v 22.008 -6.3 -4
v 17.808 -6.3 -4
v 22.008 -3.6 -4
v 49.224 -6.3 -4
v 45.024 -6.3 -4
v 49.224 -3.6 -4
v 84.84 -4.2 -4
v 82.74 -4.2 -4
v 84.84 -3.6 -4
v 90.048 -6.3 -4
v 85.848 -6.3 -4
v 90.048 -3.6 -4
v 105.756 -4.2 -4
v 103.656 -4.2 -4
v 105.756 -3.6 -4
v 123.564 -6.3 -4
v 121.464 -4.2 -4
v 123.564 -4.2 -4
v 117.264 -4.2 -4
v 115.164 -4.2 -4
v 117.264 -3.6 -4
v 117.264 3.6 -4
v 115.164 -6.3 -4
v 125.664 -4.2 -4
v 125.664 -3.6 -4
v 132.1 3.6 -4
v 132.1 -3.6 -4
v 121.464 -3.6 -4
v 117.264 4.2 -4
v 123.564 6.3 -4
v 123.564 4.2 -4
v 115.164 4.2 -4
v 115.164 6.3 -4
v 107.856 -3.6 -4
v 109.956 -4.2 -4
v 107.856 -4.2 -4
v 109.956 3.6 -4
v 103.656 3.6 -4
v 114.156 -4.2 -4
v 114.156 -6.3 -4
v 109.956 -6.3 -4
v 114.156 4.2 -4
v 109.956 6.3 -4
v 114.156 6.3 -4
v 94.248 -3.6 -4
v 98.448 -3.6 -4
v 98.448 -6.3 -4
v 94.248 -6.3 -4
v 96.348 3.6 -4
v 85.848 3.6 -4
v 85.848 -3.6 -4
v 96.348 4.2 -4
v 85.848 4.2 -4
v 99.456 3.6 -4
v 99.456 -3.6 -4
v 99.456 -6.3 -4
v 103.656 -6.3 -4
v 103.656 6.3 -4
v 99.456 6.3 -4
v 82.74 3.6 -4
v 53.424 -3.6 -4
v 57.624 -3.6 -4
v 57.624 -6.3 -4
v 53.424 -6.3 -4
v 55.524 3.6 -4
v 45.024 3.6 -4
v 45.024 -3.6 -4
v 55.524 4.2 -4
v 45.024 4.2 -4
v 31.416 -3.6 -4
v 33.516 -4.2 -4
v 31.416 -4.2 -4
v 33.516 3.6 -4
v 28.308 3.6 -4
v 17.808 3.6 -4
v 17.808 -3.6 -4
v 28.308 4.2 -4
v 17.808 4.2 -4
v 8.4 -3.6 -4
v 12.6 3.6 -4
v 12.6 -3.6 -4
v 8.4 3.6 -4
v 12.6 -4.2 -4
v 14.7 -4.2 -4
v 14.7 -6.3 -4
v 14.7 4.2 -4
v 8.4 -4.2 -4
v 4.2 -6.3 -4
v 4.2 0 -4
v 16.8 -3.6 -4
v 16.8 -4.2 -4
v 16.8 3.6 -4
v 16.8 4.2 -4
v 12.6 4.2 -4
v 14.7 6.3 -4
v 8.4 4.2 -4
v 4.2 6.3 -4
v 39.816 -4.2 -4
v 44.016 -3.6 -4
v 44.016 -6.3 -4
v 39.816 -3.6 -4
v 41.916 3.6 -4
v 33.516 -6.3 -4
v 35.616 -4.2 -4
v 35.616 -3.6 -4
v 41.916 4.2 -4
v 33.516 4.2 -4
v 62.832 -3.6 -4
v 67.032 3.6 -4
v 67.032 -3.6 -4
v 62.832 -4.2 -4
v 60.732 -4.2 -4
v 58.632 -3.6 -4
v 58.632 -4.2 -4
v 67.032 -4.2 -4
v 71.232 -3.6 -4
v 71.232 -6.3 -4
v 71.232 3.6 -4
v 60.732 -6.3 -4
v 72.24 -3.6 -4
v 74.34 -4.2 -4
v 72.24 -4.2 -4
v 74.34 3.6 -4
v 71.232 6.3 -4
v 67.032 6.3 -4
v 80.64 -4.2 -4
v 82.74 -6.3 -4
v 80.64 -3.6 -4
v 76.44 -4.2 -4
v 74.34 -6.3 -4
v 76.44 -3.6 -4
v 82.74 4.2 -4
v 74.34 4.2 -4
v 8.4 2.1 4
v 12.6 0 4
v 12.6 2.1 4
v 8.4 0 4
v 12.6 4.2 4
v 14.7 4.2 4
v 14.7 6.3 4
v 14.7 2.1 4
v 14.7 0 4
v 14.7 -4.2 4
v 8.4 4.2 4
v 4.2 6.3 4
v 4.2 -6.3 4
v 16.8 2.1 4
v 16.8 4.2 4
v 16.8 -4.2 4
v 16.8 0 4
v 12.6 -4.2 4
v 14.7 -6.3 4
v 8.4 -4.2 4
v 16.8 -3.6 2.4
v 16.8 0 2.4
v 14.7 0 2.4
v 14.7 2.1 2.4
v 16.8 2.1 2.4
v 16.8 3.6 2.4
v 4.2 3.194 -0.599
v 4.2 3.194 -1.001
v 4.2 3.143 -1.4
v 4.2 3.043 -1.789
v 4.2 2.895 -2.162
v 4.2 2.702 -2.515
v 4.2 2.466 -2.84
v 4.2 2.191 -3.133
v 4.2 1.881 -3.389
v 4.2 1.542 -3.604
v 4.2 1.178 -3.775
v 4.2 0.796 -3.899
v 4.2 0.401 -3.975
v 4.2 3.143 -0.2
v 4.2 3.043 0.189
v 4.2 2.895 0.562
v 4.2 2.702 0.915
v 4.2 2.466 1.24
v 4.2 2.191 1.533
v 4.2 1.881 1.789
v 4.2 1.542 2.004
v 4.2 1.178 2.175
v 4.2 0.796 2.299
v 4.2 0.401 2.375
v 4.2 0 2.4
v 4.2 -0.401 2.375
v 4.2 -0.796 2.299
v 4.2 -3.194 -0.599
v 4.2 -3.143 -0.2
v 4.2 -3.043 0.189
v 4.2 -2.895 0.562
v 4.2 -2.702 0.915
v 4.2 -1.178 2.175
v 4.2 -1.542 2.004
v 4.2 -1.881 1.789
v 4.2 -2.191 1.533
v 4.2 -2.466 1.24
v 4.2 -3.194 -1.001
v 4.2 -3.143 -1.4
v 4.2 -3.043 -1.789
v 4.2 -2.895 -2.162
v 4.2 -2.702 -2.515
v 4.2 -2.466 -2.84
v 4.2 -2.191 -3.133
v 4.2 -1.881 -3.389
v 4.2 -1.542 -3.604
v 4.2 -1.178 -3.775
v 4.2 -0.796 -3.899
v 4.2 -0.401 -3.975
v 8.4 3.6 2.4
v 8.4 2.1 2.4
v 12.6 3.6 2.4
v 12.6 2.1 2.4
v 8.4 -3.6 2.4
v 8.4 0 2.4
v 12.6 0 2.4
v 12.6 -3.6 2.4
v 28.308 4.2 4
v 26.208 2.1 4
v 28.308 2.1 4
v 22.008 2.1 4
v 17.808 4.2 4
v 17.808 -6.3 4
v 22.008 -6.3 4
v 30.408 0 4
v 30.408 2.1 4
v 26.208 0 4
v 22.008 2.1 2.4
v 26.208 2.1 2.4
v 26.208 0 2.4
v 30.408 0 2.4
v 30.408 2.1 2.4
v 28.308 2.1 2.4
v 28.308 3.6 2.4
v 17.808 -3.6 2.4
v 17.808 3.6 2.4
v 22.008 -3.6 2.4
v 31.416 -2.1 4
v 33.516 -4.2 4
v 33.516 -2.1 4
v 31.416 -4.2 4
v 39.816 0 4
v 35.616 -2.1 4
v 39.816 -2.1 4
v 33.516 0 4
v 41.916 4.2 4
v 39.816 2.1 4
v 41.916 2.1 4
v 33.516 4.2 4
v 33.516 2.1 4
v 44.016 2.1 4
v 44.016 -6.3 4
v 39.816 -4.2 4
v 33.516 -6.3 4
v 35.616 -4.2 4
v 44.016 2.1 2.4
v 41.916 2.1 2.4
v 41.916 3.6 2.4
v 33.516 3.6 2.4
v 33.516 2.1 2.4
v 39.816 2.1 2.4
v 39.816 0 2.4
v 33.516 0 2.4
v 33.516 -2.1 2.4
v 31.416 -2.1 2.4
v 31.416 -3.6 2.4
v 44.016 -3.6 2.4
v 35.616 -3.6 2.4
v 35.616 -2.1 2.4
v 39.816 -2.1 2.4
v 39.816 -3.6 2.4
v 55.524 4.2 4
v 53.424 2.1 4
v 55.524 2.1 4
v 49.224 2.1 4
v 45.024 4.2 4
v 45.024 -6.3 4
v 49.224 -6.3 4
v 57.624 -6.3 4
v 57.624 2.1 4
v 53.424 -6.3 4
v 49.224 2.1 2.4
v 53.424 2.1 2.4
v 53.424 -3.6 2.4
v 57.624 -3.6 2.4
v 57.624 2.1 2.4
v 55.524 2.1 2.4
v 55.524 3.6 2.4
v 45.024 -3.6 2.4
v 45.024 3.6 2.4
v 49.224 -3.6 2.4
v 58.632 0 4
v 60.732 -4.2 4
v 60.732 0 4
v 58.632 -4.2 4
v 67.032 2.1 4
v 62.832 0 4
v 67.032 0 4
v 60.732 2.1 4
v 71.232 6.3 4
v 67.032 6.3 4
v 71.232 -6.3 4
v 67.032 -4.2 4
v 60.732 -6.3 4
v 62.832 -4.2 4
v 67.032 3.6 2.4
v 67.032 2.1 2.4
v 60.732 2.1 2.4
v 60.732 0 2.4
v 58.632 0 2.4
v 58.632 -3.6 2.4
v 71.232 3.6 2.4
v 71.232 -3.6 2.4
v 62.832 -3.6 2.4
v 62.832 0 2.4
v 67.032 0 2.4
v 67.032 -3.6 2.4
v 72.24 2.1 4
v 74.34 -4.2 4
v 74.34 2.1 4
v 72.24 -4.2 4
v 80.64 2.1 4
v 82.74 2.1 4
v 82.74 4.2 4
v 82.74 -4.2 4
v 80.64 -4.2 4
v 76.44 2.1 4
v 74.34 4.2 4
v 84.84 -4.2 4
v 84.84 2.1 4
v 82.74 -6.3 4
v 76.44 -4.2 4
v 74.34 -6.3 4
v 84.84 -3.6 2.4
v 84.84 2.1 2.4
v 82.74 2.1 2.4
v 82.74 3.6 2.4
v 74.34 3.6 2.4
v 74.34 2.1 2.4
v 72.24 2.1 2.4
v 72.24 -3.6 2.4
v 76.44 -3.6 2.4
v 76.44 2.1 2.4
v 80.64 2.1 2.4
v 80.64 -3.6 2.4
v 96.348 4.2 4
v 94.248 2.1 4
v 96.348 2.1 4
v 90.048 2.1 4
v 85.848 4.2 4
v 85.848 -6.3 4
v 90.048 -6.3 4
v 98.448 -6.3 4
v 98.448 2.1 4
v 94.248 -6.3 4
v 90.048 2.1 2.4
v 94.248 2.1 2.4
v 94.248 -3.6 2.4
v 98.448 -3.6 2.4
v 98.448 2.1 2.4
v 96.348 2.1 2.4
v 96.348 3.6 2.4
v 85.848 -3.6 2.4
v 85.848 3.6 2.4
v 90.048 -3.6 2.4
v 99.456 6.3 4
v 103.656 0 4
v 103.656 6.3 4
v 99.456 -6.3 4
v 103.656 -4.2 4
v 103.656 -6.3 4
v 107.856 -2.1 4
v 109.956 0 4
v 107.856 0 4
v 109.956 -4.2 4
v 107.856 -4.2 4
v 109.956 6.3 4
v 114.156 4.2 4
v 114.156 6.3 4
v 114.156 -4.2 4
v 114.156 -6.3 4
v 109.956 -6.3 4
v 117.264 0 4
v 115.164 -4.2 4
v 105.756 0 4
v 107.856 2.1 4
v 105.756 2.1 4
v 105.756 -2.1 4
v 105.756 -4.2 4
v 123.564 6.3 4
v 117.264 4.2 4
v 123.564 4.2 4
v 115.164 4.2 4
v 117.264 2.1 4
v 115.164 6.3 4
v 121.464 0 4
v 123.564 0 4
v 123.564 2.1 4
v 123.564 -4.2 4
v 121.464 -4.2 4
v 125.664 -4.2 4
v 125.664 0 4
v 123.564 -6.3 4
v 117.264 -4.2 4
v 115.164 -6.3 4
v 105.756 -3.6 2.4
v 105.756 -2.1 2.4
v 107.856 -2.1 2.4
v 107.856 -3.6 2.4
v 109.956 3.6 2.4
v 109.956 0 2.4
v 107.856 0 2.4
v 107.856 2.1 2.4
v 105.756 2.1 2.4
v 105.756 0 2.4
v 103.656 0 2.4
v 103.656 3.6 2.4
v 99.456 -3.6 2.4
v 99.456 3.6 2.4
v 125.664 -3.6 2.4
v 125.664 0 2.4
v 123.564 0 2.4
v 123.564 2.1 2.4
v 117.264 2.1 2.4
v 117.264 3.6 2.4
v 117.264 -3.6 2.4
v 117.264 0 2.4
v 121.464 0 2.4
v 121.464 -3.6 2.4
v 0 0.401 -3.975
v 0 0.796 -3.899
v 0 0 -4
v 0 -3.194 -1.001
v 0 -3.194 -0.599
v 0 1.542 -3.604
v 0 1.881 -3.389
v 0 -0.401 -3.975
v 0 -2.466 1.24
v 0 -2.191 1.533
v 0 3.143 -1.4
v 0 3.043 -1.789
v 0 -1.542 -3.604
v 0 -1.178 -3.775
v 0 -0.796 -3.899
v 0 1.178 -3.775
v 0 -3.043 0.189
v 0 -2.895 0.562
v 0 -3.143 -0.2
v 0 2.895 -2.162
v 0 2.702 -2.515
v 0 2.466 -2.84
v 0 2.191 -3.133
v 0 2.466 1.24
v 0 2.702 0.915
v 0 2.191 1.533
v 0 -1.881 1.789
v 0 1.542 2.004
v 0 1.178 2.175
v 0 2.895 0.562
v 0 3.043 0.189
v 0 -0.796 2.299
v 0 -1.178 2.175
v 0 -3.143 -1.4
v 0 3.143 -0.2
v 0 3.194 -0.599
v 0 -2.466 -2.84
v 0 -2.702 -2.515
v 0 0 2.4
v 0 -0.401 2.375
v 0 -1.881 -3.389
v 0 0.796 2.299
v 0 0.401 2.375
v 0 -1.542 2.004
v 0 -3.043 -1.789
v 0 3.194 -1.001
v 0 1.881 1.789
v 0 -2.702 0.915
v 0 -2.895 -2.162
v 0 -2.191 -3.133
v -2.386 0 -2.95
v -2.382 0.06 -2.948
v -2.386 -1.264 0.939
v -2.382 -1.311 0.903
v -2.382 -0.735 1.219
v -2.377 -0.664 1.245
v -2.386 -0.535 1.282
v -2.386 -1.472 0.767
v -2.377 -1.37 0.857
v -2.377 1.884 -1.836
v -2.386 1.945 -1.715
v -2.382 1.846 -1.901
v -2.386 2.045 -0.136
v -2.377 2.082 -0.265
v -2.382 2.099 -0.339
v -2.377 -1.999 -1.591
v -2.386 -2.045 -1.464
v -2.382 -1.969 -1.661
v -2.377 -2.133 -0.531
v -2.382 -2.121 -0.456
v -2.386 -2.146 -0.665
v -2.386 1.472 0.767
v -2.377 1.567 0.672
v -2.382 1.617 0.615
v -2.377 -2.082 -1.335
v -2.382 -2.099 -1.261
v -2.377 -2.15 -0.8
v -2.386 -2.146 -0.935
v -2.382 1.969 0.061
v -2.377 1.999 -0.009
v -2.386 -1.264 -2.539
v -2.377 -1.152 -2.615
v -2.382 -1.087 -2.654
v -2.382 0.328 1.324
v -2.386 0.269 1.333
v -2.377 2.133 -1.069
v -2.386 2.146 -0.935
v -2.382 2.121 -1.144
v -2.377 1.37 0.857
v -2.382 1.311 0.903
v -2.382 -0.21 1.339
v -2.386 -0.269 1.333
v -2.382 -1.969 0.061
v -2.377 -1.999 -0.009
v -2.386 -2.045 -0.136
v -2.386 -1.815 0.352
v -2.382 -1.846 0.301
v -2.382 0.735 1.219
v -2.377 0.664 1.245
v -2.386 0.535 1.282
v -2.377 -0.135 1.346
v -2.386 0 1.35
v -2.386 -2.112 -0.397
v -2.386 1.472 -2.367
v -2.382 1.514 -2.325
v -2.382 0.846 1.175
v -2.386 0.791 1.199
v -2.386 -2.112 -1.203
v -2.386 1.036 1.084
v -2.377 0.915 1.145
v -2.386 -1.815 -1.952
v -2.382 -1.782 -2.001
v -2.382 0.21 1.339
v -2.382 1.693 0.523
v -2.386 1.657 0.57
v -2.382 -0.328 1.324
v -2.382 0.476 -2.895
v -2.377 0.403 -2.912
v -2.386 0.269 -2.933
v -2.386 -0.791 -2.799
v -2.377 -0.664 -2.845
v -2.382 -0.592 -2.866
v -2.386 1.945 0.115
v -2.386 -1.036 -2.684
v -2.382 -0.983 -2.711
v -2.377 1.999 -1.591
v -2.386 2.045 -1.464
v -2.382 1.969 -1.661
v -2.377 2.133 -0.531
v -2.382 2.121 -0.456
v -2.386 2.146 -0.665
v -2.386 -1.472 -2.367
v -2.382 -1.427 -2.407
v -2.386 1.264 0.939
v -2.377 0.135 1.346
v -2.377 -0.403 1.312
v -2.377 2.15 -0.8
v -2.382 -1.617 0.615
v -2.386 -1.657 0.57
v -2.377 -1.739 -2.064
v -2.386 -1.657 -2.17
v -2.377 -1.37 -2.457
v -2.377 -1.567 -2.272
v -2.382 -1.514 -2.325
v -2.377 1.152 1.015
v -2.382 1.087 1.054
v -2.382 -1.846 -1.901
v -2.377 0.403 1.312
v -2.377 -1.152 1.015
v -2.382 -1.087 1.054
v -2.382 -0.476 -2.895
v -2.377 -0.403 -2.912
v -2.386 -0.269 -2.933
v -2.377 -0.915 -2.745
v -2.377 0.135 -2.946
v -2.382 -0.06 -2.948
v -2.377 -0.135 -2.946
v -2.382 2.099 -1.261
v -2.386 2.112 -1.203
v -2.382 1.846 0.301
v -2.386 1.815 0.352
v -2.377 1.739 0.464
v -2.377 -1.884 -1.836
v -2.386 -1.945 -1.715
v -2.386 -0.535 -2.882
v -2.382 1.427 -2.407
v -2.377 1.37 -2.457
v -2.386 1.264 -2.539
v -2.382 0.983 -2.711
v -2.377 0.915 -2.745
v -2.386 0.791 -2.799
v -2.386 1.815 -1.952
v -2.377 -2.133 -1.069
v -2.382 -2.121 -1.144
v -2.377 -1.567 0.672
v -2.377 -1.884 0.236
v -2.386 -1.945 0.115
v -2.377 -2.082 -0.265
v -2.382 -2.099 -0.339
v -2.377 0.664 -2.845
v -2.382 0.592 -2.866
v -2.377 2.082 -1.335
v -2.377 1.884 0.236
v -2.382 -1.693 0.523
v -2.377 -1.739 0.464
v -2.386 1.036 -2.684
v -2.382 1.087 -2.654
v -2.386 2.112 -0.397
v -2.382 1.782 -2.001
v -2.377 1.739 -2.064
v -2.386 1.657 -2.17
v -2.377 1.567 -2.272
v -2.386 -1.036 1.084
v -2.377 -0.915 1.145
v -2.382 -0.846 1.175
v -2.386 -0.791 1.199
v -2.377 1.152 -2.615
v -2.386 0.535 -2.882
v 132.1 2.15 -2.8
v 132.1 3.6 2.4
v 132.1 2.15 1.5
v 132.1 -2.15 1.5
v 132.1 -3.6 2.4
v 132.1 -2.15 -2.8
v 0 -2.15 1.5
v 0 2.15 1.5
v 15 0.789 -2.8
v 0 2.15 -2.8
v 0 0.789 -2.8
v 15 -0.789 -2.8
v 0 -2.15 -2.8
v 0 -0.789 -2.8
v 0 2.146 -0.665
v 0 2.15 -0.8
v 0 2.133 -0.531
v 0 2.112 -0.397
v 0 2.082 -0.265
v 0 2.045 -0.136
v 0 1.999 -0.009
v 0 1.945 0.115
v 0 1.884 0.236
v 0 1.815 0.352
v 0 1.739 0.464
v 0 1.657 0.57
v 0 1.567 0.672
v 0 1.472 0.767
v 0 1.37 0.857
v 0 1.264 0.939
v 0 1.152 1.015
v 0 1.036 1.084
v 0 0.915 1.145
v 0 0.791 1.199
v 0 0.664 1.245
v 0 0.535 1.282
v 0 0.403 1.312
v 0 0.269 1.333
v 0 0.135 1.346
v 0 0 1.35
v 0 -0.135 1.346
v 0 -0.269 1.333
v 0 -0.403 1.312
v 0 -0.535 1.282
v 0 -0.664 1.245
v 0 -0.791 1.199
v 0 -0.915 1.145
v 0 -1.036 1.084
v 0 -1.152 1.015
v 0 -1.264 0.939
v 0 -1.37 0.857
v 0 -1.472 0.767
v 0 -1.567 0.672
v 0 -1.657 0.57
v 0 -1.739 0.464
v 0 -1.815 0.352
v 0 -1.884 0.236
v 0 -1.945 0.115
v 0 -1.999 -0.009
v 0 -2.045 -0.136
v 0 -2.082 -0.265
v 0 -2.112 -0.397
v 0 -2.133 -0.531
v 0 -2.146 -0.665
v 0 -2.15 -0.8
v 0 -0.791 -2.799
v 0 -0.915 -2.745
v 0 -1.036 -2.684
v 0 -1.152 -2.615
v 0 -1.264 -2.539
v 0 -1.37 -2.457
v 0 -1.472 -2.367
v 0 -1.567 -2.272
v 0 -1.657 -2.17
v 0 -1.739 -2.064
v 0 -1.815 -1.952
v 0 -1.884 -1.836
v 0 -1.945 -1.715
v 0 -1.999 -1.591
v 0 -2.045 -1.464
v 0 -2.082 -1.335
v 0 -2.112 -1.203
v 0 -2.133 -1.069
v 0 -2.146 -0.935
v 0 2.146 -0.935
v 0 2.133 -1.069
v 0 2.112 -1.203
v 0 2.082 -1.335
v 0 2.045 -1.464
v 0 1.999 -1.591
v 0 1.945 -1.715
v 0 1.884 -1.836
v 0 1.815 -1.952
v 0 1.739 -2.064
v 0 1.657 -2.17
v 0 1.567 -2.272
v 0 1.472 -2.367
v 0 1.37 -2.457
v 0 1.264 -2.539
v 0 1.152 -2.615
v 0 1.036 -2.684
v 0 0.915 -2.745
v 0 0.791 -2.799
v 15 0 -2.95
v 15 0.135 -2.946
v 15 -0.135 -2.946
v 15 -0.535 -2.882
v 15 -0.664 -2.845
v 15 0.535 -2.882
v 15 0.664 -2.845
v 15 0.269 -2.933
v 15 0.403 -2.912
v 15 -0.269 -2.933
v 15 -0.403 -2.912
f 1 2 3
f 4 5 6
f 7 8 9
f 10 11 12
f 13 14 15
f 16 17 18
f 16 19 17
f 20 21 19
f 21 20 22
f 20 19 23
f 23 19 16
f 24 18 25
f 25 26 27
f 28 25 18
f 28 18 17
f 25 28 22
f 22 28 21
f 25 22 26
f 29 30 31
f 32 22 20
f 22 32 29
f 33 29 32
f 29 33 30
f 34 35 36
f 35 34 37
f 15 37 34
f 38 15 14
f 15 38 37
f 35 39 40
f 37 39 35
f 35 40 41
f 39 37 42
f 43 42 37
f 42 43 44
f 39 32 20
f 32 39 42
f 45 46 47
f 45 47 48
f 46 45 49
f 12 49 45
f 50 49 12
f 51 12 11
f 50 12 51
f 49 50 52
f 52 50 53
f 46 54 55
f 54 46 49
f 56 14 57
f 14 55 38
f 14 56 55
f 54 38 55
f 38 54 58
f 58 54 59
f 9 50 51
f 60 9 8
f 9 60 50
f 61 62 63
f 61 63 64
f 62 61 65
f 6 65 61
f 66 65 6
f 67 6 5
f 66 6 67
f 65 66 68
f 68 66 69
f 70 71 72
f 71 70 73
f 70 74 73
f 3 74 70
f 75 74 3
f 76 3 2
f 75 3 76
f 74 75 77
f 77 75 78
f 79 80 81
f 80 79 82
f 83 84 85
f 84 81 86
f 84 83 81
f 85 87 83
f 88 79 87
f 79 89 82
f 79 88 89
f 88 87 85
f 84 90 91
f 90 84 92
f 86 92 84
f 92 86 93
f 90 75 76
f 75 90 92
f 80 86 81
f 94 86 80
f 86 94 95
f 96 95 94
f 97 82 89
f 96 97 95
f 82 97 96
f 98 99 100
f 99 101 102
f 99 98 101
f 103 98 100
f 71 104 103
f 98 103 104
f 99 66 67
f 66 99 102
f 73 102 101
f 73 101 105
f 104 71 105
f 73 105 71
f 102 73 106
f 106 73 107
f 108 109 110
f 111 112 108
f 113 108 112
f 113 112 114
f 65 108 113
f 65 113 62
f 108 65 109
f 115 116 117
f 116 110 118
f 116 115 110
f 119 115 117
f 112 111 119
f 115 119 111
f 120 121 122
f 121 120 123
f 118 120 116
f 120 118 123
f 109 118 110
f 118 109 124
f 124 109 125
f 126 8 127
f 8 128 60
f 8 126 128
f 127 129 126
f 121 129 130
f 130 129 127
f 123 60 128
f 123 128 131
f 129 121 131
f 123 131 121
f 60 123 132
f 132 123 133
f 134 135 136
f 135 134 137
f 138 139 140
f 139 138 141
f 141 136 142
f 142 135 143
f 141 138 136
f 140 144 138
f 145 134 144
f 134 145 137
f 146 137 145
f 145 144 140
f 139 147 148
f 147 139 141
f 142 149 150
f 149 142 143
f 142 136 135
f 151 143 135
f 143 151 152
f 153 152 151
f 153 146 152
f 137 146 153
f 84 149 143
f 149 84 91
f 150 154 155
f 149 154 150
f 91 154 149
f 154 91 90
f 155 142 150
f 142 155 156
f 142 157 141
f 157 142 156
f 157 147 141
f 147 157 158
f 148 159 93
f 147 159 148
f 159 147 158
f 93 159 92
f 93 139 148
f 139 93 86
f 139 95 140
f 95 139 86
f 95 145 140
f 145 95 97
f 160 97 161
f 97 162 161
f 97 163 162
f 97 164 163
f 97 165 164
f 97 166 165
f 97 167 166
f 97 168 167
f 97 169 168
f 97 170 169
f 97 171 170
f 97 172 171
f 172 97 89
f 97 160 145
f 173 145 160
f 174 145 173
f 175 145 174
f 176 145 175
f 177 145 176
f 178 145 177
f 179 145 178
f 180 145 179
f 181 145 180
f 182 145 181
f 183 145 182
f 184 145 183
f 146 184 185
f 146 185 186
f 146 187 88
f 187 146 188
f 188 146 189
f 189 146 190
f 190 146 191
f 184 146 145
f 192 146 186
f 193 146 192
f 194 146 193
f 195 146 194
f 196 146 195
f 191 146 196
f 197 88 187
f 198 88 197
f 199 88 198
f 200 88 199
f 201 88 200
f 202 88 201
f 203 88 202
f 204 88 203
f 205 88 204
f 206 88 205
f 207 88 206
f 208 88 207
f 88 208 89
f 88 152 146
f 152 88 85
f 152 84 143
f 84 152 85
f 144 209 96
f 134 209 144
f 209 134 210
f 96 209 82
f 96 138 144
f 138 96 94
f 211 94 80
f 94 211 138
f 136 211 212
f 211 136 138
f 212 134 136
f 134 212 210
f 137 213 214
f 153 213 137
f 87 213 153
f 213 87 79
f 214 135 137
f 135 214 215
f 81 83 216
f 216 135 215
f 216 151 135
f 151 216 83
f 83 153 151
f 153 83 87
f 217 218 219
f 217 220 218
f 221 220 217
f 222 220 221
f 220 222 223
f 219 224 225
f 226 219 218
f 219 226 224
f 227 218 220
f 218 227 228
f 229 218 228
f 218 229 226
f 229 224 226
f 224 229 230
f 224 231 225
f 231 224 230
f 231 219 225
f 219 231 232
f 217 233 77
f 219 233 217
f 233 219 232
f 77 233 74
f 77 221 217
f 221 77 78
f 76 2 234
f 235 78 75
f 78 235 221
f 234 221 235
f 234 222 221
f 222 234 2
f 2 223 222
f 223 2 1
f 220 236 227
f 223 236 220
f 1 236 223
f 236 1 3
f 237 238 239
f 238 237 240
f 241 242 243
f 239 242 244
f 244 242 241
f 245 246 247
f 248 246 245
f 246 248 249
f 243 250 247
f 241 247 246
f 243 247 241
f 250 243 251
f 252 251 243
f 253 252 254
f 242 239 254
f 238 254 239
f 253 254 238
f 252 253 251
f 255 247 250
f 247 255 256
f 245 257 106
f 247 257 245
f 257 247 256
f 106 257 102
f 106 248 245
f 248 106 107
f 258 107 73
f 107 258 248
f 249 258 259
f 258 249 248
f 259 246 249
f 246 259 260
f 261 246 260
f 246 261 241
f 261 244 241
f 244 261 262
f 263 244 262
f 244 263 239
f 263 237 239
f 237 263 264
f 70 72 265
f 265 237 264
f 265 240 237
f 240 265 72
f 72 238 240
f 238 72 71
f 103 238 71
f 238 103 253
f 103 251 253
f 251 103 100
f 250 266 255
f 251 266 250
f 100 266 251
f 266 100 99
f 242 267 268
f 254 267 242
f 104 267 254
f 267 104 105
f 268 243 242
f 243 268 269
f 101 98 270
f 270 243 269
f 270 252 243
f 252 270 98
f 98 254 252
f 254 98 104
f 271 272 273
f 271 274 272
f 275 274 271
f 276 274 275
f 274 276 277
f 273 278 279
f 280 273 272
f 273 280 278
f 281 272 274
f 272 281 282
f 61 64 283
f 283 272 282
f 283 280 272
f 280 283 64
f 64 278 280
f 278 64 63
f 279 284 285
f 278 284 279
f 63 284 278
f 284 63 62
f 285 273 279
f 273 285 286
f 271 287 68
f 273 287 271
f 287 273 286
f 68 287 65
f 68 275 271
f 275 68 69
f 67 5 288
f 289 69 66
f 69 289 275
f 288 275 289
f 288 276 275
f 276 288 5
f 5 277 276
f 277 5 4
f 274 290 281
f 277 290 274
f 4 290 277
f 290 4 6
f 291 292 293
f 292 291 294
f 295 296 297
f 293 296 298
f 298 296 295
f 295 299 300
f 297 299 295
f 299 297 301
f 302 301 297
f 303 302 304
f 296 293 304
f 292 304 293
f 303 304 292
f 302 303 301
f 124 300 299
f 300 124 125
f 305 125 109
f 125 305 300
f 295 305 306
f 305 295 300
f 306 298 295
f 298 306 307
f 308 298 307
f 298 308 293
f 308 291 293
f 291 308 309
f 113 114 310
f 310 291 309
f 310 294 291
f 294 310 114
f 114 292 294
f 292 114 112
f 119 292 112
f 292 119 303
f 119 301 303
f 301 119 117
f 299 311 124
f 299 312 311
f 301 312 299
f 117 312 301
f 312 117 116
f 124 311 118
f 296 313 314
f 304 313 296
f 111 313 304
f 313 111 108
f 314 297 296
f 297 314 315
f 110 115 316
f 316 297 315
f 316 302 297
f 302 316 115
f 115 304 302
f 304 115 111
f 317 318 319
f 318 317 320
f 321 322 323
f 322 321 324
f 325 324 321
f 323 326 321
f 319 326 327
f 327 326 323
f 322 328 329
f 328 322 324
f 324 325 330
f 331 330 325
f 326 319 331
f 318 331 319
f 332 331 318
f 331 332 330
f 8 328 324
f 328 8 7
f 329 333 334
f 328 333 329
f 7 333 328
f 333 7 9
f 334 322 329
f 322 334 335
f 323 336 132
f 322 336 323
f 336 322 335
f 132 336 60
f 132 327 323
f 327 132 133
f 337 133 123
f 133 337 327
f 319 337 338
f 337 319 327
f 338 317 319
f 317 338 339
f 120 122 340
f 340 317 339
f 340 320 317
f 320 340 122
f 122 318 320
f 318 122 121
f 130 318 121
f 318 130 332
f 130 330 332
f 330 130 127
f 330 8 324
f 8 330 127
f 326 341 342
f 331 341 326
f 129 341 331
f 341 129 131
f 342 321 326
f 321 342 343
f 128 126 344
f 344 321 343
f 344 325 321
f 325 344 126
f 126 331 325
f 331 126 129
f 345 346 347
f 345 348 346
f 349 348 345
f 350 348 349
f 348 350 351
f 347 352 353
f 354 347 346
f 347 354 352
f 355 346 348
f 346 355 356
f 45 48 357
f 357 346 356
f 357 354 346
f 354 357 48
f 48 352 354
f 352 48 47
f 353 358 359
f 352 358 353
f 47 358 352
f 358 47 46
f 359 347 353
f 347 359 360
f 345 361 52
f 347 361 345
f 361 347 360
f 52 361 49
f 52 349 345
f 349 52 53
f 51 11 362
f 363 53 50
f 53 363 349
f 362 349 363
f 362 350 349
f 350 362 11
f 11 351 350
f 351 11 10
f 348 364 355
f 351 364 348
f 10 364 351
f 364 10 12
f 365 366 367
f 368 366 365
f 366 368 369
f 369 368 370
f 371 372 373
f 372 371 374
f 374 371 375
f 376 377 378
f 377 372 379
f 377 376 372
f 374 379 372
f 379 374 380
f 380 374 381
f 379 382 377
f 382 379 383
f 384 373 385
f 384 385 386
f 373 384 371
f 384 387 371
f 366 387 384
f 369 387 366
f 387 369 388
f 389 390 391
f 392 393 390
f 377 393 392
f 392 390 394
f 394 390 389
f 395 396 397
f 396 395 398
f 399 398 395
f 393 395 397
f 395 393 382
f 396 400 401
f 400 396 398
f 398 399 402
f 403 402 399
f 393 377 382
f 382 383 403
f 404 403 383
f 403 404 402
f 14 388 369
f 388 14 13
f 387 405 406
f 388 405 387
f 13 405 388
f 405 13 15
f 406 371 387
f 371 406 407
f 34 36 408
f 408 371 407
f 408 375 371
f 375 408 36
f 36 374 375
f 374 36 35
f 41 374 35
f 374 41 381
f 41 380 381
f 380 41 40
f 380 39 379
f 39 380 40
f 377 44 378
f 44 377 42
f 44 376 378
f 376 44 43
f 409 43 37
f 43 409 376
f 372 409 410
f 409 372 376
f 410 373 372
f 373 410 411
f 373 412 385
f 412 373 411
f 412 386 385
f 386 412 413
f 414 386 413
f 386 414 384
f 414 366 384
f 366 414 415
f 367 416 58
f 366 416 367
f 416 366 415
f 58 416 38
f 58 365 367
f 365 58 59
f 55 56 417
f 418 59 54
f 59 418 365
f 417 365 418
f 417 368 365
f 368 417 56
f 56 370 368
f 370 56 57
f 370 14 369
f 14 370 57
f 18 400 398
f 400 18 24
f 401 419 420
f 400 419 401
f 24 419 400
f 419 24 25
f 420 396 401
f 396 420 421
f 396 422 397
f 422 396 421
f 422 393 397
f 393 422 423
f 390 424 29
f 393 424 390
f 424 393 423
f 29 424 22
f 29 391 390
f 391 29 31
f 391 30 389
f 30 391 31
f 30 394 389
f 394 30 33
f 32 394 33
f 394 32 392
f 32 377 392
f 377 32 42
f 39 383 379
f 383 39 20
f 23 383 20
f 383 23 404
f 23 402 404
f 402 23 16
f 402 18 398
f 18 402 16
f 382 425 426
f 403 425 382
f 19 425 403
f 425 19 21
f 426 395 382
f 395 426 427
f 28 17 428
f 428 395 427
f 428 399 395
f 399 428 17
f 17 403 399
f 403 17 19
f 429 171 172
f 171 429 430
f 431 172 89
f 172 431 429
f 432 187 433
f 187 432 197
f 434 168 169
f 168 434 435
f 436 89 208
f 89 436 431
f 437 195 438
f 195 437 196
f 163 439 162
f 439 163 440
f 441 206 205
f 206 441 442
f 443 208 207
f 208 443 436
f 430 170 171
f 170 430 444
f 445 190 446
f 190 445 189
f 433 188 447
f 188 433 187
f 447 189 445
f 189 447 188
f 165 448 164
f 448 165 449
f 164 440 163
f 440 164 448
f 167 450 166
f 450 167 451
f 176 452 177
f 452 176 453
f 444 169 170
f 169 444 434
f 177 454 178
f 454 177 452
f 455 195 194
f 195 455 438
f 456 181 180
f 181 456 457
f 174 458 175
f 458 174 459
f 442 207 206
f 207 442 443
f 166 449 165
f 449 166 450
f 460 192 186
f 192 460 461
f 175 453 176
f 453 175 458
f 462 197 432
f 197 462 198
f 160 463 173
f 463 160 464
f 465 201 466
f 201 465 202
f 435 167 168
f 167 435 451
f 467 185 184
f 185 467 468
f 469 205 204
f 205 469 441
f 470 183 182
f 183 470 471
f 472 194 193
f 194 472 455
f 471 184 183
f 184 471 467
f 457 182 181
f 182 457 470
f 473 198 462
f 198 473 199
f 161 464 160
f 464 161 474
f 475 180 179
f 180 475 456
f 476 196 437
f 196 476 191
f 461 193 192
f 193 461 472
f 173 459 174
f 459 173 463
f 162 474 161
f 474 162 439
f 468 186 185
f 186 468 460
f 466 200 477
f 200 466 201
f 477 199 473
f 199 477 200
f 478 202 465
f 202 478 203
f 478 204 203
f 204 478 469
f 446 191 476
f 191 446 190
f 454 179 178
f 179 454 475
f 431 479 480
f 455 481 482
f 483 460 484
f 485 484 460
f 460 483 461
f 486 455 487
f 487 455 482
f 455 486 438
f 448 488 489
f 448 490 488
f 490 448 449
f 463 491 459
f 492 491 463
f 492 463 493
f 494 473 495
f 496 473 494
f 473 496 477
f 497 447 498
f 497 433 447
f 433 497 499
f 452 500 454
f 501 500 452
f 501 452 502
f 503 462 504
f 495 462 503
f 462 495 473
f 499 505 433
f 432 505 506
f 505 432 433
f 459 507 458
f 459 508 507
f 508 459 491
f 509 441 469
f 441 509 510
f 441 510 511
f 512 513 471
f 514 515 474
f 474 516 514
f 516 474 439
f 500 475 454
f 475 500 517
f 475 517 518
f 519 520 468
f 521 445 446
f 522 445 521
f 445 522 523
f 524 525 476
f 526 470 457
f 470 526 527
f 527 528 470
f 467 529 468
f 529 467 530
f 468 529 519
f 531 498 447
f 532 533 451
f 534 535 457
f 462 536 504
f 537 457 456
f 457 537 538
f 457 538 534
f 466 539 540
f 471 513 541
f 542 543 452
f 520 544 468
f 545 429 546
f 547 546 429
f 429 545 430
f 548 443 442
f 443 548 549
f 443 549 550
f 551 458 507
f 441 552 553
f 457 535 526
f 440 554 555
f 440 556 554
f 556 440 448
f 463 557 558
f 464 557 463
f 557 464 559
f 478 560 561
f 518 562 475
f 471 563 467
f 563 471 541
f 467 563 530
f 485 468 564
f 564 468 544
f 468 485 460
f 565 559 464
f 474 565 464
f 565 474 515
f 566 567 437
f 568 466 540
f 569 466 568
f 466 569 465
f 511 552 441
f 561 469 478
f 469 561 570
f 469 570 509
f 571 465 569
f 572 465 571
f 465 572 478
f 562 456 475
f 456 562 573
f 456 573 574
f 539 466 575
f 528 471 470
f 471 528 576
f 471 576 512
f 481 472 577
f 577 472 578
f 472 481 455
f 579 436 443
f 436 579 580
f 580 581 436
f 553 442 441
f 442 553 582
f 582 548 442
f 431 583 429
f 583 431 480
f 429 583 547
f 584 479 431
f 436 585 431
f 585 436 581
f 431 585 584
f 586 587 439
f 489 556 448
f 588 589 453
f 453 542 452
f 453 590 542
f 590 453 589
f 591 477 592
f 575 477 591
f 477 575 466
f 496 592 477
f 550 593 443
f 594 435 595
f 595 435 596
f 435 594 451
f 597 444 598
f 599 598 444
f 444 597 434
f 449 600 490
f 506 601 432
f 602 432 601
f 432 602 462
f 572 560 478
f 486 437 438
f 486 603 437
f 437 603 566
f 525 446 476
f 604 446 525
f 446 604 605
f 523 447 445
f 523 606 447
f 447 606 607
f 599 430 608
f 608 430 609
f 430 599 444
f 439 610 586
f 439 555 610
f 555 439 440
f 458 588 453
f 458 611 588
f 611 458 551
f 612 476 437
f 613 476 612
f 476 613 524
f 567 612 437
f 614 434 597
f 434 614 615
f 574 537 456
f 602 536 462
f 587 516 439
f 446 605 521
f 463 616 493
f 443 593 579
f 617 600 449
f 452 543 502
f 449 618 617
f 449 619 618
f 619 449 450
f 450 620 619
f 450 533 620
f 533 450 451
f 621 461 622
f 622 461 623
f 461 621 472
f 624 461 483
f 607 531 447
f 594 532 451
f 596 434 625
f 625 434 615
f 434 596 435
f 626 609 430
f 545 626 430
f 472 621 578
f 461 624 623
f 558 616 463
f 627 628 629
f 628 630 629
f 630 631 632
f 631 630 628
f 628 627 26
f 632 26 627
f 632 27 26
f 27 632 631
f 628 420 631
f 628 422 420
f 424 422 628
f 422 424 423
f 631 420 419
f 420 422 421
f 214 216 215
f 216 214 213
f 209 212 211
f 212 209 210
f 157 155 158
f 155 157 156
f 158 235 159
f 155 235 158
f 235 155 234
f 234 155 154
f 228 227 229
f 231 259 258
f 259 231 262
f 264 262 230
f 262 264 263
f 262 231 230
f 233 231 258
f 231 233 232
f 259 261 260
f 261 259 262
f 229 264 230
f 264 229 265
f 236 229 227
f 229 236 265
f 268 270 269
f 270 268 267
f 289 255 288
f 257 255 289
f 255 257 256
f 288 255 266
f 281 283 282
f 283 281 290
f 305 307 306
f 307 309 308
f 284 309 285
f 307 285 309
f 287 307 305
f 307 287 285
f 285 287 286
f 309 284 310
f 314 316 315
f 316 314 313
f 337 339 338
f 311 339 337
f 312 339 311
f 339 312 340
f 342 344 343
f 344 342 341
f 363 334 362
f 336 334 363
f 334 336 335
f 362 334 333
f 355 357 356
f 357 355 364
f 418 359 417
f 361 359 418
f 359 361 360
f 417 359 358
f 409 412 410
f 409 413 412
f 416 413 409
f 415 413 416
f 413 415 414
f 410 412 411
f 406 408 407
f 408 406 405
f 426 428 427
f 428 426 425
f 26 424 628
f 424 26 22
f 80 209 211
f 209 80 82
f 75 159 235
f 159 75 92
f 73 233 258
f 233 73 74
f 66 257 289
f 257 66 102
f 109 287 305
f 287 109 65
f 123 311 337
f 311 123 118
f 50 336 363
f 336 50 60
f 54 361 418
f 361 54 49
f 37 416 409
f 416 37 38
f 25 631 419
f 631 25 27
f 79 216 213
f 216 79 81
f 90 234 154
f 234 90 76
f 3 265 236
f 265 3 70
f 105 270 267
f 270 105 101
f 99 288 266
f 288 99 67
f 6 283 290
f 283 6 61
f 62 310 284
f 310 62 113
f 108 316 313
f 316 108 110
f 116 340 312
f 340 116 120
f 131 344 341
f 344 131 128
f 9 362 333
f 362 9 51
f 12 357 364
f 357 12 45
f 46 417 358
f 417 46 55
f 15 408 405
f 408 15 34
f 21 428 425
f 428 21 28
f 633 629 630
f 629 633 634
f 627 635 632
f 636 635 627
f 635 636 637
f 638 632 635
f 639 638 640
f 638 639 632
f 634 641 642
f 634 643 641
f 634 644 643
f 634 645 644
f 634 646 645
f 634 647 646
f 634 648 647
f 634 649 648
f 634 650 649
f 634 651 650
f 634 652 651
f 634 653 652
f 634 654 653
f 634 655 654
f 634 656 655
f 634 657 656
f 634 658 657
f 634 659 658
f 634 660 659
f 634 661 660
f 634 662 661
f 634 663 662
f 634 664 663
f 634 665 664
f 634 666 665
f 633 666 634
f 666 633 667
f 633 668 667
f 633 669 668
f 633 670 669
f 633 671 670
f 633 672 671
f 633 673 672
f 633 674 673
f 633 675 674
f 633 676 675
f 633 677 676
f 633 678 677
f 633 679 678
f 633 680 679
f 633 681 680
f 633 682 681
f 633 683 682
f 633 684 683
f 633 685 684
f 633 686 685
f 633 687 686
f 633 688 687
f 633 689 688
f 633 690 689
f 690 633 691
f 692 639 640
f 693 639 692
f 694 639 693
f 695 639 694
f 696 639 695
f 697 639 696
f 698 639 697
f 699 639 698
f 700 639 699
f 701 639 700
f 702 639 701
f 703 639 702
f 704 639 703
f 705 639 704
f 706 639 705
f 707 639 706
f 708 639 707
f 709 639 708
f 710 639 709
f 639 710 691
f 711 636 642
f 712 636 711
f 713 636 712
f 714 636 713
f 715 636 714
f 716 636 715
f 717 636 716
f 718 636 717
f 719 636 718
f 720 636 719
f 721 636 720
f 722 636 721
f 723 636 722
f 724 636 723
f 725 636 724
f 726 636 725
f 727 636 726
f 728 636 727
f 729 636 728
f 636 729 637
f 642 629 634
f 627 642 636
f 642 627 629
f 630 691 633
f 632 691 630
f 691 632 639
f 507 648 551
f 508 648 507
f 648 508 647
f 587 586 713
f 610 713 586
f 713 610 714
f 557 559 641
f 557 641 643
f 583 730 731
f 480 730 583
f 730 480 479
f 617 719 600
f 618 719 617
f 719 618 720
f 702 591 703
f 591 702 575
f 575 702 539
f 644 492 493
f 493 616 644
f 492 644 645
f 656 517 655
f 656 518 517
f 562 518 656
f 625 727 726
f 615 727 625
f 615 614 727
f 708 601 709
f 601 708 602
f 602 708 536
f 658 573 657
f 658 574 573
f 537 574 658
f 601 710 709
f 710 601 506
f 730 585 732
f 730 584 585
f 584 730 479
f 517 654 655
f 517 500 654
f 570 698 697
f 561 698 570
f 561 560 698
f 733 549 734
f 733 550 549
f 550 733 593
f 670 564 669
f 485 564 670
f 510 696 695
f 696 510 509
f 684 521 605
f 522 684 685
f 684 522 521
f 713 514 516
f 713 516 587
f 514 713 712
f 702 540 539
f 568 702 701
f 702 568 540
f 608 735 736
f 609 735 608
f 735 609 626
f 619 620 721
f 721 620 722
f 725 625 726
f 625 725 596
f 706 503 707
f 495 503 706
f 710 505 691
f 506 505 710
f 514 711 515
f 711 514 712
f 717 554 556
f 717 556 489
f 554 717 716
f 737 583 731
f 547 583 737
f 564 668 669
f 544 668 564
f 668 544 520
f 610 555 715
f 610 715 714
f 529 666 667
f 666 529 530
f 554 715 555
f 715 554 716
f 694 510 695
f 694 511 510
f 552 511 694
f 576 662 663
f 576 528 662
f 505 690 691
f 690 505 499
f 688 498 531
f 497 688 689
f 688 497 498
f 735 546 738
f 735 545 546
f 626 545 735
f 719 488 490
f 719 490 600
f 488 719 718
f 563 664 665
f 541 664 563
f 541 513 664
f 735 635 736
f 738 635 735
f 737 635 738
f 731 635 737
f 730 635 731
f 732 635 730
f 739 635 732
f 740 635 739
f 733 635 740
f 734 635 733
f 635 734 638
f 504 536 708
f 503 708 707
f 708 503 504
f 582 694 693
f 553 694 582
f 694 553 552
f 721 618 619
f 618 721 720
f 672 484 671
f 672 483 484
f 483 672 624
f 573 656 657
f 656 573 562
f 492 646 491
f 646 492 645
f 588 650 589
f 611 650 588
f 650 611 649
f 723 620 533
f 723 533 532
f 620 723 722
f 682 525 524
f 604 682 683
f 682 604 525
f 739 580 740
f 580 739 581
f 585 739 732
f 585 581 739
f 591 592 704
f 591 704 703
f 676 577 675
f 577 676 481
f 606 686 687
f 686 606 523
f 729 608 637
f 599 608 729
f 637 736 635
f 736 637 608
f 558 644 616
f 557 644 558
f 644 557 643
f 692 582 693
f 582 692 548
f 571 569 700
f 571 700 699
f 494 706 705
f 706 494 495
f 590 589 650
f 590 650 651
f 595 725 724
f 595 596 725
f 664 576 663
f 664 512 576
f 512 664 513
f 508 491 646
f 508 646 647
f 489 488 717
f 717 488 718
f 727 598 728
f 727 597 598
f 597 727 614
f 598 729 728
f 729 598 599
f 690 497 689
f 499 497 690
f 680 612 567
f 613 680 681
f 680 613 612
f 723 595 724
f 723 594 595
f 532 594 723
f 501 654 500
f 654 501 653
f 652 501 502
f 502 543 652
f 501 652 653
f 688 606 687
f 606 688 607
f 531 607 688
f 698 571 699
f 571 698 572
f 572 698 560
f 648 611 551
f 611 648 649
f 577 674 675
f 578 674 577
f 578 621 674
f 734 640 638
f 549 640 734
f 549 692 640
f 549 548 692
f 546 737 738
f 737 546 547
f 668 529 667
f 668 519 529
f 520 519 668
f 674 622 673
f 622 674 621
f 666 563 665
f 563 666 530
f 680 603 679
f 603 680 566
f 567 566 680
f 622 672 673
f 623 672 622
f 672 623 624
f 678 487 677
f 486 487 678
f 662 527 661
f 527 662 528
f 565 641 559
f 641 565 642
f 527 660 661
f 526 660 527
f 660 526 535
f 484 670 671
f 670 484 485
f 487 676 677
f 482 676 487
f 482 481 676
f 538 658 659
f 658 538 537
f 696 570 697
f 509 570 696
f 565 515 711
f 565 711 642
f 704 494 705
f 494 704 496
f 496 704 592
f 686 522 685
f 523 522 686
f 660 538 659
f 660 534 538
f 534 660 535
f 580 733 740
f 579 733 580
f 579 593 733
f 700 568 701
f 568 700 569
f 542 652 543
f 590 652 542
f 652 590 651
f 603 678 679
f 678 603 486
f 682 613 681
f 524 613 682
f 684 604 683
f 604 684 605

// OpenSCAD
// [FL_INDEX: keywords="openscad, 3d_parametric, Retro_Font_Word_Pen, csg_solid" | COT="Parametric OpenSCAD design from 3DCodeverse"]
// Title: Retro Font Word Pen

use <MCAD/fonts.scad>

// Word to display on the pen
word = "BrandonW6";

// Scale multipler for font size
font_scale = 2.1	;

// Character Spacing (for some reason this value is buggy using the customizer)
font_spacing = 0.81; 

// The diameter of end hole
pen_inner_diameter = 4.3 *1;
pen_inner_radius = pen_inner_diameter / 2;

// length of the entire pen
pen_length = 130; //

// Overal thickness of the pen
pen_thickness = 8*1;


/////////////////////////////////////////
//////////////////////////////////



module penword()
{

thisFont=8bit_polyfont();
x_shift=thisFont[0][0] * font_spacing;
y_shift=thisFont[0][1];

	theseIndicies=search(word,thisFont[2],1,1);
	wordlength = (len(theseIndicies))* x_shift;
	
	difference() {

		union() {

// Create the Text //
			scale([font_scale,font_scale,1]){
			for( j=[0:(len(theseIndicies)-1)] ) 
				translate([ j*x_shift + 1, -y_shift/2 ,-pen_thickness/2]) 
				{
					linear_extrude(height=pen_thickness) polygon(points=thisFont[2][theseIndicies[j]][6][0],paths=thisFont[2][theseIndicies[j]][6][1]);
				}
			}
			
// Main body
			translate([1*font_scale+3	,-y_shift*.45,-pen_thickness/2]) cube([pen_length - 3,y_shift * 0.9,pen_thickness * 0.8]);

// Pen Tip
			rotate(a=[0,90,0]) 
				{
					translate([pen_thickness*0.1,0,0	])	cylinder(h = 5, r = pen_thickness*.4, $fn=50);
					translate([pen_thickness*0.1,0,-5	])	cylinder(h = 5, r1 = 1, r2 = pen_thickness*.4, $fn=50);
				}			
		}
// Cut outs
			translate([0,-pen_inner_diameter/2,-pen_thickness/2+pen_thickness*.15]) cube([pen_length + 20,pen_inner_diameter,pen_inner_diameter]);
			rotate(a=[0,90,0])translate([pen_thickness*.1,0,-15])	cylinder(h = 30, r = pen_inner_radius, $fn=100);
	}
}




penword();
